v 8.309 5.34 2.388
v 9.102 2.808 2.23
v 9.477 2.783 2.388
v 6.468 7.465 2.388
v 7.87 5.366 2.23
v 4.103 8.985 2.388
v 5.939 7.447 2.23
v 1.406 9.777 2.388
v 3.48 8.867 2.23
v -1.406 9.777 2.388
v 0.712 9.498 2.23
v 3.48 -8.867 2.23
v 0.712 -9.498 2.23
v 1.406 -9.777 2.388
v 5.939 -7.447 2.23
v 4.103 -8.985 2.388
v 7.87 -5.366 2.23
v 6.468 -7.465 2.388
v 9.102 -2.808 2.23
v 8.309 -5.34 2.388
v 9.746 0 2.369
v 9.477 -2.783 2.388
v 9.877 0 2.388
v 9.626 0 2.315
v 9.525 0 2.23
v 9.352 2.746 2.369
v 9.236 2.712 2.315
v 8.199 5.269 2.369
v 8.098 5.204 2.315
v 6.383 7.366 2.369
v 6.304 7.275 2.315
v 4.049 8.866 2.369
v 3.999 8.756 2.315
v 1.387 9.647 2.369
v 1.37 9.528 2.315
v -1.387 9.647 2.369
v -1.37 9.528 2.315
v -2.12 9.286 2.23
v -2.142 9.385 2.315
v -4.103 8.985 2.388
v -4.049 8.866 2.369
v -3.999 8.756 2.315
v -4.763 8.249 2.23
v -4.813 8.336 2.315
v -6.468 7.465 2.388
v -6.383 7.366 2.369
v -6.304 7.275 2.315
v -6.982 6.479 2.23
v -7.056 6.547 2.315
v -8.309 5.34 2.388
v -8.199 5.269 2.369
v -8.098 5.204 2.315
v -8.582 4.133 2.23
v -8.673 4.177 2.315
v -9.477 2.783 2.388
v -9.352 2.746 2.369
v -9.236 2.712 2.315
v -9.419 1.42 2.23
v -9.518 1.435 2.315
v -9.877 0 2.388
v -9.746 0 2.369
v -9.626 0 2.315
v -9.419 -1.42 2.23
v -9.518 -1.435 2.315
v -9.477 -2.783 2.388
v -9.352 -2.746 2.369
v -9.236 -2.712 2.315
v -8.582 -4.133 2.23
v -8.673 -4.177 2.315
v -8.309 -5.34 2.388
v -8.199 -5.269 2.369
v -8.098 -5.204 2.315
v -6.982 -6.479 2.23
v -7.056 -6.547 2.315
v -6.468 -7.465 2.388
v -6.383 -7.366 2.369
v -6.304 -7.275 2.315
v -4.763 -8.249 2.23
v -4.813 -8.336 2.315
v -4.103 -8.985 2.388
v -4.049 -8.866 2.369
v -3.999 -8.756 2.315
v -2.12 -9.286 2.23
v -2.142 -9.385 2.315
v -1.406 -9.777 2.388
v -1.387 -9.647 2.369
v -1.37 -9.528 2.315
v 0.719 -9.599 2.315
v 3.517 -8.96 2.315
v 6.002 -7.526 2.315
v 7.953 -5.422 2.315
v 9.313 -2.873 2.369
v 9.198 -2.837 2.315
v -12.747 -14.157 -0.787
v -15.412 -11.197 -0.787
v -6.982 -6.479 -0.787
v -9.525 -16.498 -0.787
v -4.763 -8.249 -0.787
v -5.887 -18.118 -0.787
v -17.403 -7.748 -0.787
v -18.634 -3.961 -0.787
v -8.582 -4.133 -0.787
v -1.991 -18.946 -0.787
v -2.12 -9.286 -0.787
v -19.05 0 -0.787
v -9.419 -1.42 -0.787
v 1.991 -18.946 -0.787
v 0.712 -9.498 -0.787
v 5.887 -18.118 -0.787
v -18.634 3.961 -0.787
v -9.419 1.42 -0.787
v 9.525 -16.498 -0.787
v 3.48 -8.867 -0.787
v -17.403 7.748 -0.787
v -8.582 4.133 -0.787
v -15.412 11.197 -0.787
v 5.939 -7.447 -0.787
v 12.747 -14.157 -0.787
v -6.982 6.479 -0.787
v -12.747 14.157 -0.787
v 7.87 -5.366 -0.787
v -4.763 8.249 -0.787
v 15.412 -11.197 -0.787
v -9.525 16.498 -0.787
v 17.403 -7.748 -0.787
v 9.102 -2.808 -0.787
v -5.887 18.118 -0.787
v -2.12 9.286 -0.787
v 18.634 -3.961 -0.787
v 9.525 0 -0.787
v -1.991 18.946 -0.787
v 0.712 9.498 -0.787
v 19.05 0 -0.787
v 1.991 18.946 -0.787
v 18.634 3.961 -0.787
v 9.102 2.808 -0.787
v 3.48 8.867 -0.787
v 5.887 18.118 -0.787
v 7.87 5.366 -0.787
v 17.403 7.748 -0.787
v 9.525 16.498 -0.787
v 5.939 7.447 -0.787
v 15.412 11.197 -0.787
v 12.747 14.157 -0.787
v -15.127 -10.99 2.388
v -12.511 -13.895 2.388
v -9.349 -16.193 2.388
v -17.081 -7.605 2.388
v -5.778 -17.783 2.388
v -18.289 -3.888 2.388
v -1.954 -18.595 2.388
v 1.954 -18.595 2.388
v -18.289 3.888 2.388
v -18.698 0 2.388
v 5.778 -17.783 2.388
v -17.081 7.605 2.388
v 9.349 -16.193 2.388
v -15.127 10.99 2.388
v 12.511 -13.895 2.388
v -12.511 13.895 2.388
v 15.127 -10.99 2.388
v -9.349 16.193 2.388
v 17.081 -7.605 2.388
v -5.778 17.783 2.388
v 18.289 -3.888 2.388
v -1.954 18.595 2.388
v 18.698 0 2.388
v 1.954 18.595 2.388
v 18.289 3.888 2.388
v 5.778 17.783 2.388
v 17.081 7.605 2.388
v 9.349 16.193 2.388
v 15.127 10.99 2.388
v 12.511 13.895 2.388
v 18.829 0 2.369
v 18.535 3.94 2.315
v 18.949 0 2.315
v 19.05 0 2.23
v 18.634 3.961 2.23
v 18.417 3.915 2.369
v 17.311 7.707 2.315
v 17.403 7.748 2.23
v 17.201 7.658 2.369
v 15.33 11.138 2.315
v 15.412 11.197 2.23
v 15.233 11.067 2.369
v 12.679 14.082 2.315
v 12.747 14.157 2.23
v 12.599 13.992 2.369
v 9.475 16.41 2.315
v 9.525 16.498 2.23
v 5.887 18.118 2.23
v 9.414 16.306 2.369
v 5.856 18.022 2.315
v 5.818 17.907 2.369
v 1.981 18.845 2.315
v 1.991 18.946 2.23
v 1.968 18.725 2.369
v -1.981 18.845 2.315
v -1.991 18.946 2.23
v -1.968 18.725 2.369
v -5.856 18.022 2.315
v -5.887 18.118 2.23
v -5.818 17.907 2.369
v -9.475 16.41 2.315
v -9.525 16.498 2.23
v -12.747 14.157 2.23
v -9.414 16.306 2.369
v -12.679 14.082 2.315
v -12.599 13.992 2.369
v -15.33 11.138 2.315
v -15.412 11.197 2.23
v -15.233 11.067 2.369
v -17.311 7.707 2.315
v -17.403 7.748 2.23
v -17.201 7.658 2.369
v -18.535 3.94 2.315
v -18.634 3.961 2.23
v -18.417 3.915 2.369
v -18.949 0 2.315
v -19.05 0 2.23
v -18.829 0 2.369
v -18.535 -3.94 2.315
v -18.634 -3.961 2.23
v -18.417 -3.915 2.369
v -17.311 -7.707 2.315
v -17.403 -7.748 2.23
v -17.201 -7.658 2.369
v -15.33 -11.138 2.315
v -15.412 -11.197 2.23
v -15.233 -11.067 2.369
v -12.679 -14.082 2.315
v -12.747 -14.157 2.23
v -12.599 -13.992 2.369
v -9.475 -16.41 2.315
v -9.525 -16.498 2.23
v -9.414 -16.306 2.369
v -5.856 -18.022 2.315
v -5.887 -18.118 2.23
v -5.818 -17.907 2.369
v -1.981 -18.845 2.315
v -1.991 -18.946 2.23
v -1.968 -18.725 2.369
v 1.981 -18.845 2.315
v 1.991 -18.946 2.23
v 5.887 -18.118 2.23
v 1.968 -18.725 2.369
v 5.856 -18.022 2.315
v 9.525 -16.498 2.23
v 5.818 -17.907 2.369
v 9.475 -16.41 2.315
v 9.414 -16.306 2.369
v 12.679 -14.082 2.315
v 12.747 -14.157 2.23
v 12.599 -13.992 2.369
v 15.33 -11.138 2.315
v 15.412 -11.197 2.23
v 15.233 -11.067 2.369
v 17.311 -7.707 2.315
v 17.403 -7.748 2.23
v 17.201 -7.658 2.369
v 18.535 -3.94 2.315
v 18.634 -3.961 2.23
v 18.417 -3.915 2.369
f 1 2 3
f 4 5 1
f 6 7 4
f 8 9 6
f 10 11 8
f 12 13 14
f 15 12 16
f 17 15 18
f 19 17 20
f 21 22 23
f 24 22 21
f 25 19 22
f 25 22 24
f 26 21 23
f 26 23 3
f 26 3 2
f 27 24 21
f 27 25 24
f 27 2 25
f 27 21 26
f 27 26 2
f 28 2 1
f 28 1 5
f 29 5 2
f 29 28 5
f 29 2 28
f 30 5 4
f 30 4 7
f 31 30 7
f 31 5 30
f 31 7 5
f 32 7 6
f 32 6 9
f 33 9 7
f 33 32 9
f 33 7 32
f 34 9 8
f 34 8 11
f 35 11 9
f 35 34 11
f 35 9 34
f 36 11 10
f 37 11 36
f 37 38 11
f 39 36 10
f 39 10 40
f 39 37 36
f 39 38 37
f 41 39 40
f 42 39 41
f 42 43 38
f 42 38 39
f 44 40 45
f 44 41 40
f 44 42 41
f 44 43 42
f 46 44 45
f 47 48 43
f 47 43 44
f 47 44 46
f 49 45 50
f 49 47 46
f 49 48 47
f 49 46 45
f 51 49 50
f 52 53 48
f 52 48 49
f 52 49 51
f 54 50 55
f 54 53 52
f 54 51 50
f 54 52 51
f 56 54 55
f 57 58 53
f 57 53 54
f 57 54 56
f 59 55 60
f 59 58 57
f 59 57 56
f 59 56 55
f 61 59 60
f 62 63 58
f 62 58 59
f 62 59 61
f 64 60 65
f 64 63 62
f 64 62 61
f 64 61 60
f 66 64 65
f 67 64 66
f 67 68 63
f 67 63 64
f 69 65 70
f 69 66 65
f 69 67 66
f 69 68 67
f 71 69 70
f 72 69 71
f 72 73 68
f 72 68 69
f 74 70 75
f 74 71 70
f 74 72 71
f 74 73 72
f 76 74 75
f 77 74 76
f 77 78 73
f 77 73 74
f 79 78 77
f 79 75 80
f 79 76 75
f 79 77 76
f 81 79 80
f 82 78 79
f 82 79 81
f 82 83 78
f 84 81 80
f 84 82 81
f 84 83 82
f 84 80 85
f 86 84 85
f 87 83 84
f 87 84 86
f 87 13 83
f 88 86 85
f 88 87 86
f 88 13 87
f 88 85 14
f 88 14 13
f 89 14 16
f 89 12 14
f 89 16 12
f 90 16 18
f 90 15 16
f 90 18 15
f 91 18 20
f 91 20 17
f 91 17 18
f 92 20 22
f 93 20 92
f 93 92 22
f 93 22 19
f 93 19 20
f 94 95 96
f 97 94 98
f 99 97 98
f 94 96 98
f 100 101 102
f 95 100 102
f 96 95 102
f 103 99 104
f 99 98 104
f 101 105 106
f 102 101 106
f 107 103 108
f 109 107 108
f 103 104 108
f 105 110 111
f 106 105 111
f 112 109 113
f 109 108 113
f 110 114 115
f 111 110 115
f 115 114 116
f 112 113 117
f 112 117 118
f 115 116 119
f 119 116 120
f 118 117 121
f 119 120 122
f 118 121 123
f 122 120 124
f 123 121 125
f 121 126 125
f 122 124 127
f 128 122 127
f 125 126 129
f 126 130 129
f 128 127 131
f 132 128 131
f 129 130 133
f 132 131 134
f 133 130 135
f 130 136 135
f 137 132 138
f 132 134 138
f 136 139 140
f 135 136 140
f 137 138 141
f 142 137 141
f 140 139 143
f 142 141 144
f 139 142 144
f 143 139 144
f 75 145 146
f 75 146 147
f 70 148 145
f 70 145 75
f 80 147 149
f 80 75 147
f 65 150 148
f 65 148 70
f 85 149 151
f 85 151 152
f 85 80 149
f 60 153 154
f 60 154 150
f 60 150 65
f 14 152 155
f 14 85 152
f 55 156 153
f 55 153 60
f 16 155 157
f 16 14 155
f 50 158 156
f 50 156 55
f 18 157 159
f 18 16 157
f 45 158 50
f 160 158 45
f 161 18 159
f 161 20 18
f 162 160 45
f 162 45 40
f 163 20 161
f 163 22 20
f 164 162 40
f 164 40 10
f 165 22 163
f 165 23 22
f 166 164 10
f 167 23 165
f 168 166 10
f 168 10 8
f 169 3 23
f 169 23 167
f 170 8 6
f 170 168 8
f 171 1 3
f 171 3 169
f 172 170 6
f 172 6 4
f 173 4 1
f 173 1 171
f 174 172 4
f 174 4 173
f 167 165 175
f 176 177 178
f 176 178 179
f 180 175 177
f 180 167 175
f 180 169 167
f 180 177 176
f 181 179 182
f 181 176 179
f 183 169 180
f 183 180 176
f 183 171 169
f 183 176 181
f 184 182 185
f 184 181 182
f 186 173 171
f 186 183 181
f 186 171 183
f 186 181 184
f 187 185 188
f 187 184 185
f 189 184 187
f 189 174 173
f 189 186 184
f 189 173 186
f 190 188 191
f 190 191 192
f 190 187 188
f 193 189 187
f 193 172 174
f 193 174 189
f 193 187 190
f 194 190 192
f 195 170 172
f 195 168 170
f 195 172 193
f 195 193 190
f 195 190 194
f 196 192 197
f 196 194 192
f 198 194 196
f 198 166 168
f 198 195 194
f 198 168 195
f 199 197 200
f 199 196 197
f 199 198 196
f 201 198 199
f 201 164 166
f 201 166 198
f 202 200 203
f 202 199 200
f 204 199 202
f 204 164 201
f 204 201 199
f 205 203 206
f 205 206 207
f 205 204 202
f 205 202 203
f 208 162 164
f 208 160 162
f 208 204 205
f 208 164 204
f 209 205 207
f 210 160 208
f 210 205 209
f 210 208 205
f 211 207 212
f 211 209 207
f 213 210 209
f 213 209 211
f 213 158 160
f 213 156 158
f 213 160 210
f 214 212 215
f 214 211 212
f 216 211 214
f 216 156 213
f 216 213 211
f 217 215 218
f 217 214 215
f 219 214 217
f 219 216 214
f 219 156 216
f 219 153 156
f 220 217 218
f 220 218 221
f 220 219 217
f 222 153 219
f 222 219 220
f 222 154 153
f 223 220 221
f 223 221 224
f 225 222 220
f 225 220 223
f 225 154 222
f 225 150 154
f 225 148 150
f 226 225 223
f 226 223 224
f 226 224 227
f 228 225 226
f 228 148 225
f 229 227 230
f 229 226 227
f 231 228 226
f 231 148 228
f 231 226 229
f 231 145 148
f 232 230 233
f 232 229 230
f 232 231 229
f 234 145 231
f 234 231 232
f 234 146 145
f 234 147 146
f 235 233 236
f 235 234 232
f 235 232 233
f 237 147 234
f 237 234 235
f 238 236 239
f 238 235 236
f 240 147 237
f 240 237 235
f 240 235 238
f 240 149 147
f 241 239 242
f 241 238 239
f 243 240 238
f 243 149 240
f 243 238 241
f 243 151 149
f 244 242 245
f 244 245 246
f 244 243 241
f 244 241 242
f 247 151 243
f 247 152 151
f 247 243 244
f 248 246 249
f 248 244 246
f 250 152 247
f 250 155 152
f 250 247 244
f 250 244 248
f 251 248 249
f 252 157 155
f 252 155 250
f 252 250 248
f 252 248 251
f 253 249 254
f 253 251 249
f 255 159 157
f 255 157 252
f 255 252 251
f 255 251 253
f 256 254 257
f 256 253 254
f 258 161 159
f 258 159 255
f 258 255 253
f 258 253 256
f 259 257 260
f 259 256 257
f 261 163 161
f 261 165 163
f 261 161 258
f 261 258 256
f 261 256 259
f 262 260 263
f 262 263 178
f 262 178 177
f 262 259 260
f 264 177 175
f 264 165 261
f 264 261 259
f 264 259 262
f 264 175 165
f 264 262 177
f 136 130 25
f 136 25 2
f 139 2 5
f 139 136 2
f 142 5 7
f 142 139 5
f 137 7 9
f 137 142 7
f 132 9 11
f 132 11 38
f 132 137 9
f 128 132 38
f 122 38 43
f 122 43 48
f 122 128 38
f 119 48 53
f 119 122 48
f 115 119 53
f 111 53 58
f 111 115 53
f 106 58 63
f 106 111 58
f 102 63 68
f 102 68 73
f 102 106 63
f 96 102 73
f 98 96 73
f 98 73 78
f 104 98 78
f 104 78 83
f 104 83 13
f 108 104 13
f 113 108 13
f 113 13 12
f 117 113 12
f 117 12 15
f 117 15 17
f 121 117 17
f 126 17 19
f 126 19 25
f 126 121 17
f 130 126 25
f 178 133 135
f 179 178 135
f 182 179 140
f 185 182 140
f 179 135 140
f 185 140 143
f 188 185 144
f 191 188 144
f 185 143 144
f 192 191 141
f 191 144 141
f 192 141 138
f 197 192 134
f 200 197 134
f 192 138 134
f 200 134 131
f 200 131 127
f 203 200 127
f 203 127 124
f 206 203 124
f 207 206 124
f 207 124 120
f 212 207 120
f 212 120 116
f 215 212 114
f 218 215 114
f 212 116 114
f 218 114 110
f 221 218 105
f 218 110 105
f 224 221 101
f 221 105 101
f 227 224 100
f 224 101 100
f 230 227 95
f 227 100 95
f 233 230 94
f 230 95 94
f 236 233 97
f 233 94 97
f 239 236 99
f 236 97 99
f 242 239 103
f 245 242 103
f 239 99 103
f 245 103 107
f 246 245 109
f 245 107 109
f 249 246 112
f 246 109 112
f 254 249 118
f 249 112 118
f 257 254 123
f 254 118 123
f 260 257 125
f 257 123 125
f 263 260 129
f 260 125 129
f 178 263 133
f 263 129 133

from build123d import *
from OCP.BRepFilletAPI import BRepFilletAPI_MakeChamfer

# Parameters (mm, degrees)
BOSS_EXTRUDE1_START = -0.7874
SKETCH3_R           = 19.05
SKETCH3_R_2         = 9.525
BOSS_EXTRUDE1_DEPTH = 3.175
CHAMFER1_SIZE       = 0.15748
CHAMFER1_SIZE2      = 0.09092112
FILLET1_R           = 0.47244


with BuildPart() as part:
    # Sketch3 → Boss-Extrude1 (new body)
    with BuildSketch(Plane.XY.offset(BOSS_EXTRUDE1_START)):
        Circle(SKETCH3_R)
        Circle(SKETCH3_R_2, mode=Mode.SUBTRACT)
    extrude(amount=BOSS_EXTRUDE1_DEPTH)

    # Chamfer1: one chamfer whose edges measure the first distance from different faces: ONE call of the kernel's chamfer builder (chamfer() names one face for all edges)
    chamfer1_edges_1 = [part.edges().sort_by_distance(p)[0] for p in [
        (-19.05, 0, 2.3876),
    ]]
    chamfer1_side_1 = [part.faces().sort_by_distance(p)[0] for p in [
        (-19.05, 0, 0.8001),
    ]]
    chamfer1_edges_2 = [part.edges().sort_by_distance(p)[0] for p in [
        (-9.525, 0, 2.3876),
    ]]
    chamfer1_side_2 = [part.faces().sort_by_distance(p)[0] for p in [
        (-9.525, 0, 0.8001),
    ]]
    chamfer1 = BRepFilletAPI_MakeChamfer(part.part.solid().wrapped)
    for e in chamfer1_edges_1:
        chamfer1.Add(CHAMFER1_SIZE, CHAMFER1_SIZE2, e.wrapped, chamfer1_side_1[0].wrapped)  # the first distance lies on this face
    for e in chamfer1_edges_2:
        chamfer1.Add(CHAMFER1_SIZE, CHAMFER1_SIZE2, e.wrapped, chamfer1_side_2[0].wrapped)  # the first distance lies on this face
    add(Compound.cast(chamfer1.Shape()), mode=Mode.REPLACE)

    # Fillet1
    # the kernel refuses this fillet: 0.47244 mm, written as the material it takes off along each edge
    with BuildSketch(Plane(origin=(0, 0, 2.3876), x_dir=(1, 0, 0), z_dir=(0, -1, 0))) as fillet1_piece_1:
        with BuildLine():
            CenterArc((18.697864015, -0.47244), FILLET1_R, 41.810314896, 48.189685104)
            Line((18.697864015, 0), (18.697864015, 0.0094488))
            Line((18.697864015, 0.0094488), (18.95907888, 0.0094488))
            Line((18.95907888, 0.0094488), (18.96726178, 0.0047244))
            ThreePointArc((18.96726178, 0.0047244), (19.012722341, -0.0740156), (19.05704272, -0.1511808))
            Line((19.05704272, -0.1511808), (19.05, -0.15748))
        make_face()
    revolve(axis=Axis((0, 0, 2.3876), (0, 0, 1)), mode=Mode.SUBTRACT)
    with BuildSketch(Plane(origin=(0, 0, 2.3876), x_dir=(1, 0, 0), z_dir=(0, -1, 0))) as fillet1_piece_2:
        with BuildLine():
            CenterArc((9.877135985, -0.47244), FILLET1_R, 90, 48.189685104)
            Line((9.525, -0.15748), (9.51795728, -0.1511808))
            ThreePointArc((9.51795728, -0.1511808), (9.562277659, -0.0740156), (9.60773822, 0.0047244))
            Line((9.60773822, 0.0047244), (9.61592112, 0.0094488))
            Line((9.61592112, 0.0094488), (9.877135985, 0.0094488))
            Line((9.877135985, 0.0094488), (9.877135985, 0))
        make_face()
    revolve(axis=Axis((0, 0, 2.3876), (0, 0, 1)), mode=Mode.SUBTRACT)


solid = part.part
